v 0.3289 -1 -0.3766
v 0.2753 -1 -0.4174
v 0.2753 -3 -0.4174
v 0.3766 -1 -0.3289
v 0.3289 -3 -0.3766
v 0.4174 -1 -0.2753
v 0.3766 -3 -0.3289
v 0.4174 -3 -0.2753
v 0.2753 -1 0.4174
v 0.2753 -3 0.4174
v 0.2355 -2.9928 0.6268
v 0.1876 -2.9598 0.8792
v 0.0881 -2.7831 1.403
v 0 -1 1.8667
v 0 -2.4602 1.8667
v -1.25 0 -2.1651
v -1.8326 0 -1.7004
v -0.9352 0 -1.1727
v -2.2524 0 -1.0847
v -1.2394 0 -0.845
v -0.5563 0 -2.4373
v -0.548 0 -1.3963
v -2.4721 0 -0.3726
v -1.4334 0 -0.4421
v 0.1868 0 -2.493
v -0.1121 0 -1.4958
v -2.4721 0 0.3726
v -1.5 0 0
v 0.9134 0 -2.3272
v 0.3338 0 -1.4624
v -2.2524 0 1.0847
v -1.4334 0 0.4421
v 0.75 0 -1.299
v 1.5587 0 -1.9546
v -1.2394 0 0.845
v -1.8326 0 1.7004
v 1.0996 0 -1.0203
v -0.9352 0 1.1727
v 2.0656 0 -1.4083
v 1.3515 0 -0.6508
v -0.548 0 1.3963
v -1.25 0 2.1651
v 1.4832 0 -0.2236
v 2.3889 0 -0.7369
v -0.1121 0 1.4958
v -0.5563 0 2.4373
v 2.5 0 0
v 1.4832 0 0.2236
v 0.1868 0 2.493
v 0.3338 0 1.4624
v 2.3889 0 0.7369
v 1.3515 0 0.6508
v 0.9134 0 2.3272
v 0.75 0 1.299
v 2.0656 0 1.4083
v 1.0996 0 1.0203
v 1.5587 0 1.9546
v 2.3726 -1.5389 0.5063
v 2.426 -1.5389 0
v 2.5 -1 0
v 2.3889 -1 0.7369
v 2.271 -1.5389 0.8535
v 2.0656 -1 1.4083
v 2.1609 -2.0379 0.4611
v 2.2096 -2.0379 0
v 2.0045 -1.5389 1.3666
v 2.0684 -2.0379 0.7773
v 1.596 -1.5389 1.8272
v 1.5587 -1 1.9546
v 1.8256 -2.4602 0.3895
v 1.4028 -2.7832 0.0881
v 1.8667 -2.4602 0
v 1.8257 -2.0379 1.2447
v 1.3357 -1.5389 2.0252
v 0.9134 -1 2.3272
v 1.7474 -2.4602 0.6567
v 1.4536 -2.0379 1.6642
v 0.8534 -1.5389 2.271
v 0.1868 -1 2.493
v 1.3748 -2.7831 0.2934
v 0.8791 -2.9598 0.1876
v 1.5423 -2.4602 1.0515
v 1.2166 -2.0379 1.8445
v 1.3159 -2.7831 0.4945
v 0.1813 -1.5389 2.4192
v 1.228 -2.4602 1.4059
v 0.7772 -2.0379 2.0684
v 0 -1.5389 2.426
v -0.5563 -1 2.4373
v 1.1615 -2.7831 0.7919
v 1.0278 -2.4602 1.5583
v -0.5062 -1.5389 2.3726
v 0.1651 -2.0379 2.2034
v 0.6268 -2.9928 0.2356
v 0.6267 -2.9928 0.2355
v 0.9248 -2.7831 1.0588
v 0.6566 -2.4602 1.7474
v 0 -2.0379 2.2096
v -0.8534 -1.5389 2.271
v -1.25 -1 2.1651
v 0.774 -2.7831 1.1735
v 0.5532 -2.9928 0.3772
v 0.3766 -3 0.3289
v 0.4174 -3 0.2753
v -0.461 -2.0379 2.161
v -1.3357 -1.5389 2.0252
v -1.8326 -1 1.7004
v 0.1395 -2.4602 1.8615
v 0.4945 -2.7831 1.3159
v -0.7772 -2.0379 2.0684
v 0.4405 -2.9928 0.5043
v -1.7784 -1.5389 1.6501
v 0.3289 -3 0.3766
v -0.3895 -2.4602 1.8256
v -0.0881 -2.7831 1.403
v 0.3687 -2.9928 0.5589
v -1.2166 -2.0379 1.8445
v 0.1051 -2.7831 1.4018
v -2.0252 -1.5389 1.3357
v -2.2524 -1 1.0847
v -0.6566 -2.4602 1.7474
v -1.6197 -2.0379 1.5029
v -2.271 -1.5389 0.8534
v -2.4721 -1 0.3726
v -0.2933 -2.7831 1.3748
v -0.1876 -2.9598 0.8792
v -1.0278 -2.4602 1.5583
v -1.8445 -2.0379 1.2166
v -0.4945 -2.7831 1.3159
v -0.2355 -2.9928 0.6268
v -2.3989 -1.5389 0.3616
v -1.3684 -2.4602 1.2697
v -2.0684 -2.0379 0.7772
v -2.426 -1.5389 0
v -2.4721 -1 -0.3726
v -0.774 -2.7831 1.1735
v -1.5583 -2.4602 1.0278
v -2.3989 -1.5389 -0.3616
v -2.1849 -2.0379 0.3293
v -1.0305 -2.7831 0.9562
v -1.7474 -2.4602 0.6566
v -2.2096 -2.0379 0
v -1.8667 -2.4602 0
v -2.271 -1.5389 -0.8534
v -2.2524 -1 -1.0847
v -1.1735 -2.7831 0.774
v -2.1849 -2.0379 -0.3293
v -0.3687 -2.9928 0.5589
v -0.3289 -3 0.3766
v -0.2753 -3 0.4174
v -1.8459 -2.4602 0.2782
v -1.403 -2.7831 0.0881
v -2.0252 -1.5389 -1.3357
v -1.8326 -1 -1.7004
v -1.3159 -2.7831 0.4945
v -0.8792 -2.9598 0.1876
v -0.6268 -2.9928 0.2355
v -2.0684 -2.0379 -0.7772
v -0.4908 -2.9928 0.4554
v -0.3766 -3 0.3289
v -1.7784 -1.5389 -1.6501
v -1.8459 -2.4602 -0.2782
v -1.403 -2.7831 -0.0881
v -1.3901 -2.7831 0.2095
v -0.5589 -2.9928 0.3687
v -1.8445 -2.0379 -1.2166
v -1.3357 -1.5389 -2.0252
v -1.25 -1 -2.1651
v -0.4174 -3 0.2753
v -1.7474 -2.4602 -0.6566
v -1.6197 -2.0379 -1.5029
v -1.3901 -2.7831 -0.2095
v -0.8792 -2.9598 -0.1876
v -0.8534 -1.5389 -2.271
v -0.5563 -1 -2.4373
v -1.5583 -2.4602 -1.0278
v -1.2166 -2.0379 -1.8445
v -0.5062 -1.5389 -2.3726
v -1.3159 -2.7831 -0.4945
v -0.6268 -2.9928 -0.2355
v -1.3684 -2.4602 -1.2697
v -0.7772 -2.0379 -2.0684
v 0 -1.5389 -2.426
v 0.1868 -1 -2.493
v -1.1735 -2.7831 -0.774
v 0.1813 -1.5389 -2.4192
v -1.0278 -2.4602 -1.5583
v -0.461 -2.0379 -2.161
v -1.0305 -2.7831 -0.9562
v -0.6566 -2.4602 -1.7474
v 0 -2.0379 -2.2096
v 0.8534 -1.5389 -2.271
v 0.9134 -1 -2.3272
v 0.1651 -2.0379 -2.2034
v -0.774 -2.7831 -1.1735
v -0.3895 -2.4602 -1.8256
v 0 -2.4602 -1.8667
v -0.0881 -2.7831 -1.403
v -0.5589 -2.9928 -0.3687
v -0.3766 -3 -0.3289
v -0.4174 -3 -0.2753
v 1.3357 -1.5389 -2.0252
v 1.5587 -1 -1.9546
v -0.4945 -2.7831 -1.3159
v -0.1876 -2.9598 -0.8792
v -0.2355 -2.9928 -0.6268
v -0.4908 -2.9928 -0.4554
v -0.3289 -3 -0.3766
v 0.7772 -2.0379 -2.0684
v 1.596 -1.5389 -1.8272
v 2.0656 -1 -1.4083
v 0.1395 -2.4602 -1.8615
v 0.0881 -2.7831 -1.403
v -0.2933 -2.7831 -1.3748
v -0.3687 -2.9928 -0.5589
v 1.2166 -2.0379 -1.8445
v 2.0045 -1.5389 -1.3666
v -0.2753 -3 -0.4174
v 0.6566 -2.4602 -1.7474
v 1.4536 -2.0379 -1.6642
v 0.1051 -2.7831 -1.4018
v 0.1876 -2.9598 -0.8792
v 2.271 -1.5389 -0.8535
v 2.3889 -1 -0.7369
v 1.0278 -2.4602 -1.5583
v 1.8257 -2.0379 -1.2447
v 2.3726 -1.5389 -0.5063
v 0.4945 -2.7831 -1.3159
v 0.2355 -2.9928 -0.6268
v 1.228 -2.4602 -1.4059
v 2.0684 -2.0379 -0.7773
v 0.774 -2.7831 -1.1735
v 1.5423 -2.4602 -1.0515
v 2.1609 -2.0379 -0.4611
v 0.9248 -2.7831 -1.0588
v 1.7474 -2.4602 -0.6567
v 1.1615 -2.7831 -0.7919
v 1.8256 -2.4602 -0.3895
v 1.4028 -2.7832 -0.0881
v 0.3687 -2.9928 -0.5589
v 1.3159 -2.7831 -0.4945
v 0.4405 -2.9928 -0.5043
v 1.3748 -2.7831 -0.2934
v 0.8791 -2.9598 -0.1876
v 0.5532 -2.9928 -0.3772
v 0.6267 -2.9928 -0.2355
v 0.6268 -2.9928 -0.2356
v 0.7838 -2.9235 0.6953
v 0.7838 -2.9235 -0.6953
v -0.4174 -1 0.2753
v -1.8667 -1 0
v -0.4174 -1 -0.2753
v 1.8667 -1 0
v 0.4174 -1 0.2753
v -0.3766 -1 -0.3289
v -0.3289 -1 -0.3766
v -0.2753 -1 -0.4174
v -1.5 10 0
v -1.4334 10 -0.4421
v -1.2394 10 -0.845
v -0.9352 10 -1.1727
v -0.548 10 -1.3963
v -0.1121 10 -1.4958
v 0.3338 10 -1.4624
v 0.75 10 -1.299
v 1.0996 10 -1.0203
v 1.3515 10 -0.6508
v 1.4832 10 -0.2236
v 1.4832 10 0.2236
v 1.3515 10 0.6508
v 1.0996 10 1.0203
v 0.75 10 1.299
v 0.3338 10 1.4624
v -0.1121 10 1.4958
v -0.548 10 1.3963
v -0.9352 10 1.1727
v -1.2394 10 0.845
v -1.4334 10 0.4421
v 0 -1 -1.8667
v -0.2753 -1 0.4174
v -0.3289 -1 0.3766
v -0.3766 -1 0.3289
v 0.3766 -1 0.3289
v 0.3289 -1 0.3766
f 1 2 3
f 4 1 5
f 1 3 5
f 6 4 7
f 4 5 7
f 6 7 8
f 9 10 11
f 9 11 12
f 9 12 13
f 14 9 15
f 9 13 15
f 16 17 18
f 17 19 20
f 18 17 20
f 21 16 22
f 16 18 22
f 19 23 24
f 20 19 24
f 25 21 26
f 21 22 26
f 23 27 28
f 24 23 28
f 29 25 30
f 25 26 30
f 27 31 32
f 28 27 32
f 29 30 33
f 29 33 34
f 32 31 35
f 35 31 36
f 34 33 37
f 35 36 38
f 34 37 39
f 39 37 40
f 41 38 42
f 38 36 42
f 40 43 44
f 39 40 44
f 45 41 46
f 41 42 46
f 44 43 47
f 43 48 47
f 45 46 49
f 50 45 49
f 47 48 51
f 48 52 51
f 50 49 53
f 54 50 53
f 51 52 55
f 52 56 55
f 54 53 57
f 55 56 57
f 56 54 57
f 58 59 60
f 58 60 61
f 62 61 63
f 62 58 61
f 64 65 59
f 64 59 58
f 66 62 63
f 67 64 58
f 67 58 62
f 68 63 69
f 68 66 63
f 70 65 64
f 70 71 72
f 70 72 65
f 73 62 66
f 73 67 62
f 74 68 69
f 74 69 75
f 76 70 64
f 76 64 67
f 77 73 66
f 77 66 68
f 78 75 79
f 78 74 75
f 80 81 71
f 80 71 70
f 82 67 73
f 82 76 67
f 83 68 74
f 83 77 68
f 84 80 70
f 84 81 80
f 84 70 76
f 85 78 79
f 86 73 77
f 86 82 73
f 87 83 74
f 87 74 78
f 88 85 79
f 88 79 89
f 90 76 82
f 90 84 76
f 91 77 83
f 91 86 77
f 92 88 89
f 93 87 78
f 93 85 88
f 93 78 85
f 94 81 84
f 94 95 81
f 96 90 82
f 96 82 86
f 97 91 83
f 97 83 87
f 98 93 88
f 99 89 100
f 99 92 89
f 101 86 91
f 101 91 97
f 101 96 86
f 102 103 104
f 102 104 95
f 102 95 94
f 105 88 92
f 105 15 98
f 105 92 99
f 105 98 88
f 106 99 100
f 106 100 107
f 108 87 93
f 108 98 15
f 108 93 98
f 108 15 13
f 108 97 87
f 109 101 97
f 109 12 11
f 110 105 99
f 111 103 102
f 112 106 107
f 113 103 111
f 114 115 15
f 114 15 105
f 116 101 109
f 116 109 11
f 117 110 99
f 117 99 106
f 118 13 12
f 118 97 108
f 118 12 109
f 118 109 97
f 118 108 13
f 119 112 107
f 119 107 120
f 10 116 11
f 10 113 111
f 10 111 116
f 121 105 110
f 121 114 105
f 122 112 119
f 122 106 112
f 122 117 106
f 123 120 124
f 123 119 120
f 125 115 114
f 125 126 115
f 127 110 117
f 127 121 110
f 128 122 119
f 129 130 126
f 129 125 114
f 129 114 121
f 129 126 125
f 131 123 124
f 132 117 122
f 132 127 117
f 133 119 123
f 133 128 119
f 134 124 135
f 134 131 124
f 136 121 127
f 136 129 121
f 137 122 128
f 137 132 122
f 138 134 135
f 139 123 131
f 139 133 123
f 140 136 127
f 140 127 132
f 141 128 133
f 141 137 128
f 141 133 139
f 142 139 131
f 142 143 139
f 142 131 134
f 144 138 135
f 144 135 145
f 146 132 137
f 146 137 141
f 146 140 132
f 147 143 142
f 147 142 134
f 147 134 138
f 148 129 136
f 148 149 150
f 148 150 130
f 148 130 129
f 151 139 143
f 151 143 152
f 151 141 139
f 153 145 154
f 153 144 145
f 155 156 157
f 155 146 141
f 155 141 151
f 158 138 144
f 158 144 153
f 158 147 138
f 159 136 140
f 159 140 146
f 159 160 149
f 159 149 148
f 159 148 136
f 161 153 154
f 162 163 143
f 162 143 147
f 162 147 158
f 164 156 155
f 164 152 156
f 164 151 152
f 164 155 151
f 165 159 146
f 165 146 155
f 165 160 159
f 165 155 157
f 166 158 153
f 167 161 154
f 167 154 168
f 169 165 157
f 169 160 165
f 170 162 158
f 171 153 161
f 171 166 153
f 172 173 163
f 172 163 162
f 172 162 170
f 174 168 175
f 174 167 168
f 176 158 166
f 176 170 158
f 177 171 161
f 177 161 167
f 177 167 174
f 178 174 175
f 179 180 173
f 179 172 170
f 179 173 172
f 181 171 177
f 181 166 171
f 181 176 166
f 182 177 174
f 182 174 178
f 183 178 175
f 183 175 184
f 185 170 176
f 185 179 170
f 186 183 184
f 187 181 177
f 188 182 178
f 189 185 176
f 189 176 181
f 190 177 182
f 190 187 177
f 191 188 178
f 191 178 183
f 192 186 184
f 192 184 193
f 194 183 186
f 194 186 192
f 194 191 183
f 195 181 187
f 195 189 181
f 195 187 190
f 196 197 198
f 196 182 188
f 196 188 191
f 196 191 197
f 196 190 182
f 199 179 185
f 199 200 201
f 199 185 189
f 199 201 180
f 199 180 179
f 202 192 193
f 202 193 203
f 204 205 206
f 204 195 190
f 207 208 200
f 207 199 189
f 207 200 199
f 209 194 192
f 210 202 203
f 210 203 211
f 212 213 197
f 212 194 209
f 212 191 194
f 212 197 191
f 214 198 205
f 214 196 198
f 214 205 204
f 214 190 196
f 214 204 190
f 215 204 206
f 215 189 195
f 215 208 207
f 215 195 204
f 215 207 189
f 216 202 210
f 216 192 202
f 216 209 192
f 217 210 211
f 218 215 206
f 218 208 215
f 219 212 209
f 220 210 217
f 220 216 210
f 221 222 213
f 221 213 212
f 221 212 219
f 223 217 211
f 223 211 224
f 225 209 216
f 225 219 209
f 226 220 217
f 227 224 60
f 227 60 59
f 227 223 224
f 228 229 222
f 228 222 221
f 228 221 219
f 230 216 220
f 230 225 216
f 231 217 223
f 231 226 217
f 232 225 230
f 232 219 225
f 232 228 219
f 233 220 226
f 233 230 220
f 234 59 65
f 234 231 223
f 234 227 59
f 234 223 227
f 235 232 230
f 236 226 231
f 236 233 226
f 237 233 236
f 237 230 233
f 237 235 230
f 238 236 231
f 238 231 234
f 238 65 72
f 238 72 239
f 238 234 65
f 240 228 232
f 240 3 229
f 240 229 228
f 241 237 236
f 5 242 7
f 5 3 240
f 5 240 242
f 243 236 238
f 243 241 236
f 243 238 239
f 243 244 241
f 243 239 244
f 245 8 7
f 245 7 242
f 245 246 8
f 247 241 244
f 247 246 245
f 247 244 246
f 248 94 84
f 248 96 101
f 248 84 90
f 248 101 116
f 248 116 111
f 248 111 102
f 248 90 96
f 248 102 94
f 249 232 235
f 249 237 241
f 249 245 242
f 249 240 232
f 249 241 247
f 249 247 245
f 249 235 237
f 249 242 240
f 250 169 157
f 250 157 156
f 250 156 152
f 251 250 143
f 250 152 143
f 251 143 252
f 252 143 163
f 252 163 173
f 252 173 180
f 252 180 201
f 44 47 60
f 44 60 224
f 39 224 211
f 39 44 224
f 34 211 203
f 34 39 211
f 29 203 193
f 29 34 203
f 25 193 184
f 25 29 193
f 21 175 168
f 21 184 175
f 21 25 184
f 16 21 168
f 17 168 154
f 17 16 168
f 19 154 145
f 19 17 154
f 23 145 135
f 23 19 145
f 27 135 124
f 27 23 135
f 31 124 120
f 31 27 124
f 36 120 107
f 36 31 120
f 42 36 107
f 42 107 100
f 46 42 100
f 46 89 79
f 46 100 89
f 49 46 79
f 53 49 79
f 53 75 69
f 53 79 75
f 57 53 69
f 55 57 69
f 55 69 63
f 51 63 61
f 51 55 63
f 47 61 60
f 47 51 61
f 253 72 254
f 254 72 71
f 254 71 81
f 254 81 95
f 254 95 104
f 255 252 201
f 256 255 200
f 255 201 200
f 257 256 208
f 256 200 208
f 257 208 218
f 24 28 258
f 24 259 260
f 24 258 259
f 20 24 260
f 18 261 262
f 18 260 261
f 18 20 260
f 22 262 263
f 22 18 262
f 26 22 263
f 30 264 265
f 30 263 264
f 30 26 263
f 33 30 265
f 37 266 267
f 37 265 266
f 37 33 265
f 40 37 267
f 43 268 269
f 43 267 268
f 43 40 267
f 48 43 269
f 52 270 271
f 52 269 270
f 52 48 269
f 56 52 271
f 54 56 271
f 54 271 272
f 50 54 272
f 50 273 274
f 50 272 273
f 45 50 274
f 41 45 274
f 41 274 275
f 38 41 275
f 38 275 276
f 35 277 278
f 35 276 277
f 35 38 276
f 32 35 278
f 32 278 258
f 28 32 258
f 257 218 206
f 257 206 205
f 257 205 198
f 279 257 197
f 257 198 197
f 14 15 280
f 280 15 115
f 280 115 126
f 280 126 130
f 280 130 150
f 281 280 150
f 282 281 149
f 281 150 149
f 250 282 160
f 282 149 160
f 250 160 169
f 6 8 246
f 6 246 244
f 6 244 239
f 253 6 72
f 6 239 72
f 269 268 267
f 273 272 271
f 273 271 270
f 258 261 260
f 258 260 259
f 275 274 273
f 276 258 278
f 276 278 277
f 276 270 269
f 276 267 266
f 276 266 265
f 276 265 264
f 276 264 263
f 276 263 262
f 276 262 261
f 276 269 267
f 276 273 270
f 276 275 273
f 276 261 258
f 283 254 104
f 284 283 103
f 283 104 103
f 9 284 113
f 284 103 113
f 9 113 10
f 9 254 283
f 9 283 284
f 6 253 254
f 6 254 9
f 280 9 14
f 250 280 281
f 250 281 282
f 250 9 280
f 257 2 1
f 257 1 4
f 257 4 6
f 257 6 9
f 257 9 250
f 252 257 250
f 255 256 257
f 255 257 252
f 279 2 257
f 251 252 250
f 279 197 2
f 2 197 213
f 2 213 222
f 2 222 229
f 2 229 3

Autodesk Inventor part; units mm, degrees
ref_plane "YZ Plane" through (0, 0, 0) normal (1, 0, 0) x (0, 1, 0)
ref_plane "XZ Plane" through (0, 0, 0) normal (0, 1, 0) x (-1, 0, 0)
ref_plane "XY Plane" through (0, 0, 0) normal (0, 0, 1) x (1, 0, 0)
sketch "Sketch1" plane through (0, 0, 0) normal (0, 1, 0) x (-1, 0, 0)
  circle A0 centre (0, 0) radius 1.5
  dimension "d0" = 3
extrude "Extrusion1" add sketch "Sketch1" along normal blind 10
sketch "Sketch2" plane through (0, 0, 0) normal (0, -1, 0) x (1, 0, 0)
  circle A0 centre (0, 0) radius 2.5
  dimension "d3" = 5
extrude "Extrusion2" add sketch "Sketch2" along normal blind 3
fillet "Fillet1" radius 2 1 edges at (-2.5, -3, 0)
sketch "Sketch3" plane through (0, -3, 0) normal (0, -1, 0) x (1, 0, 0)
  circle A0 centre (0, 0) radius 0.5 projected
  line L0 (-1.8667, 0) -> (-0.4174, -0.2753)
  circle A1 centre (0, 0) radius 0.5 projected
  line L1 (-1.8667, 0) -> (-0.5, 0)
  dimension "d9" = 0
extrude "Extrusion3" cut sketch "Sketch3" against normal blind 2 contours A0 L0 L1
mirror "Mirror1" about plane through (0, 0, 0) normal (0, 0, 1) of "Extrusion3"
pattern_circular "Circular Pattern1" count 4 over 360 about axis through (0, -1, 0) along (0, -1, 0) of "Extrusion3", "Mirror1"
sketch "Sketch4" plane through (0, -3, 0) normal (0, -1, 0) x (1, 0, 0)
  arc A0 (-0.4174, 0.2753) -> (-0.4174, -0.2753) centre (0, 0) ccw projected
  arc A1 (-0.4174, -0.2753) -> (-0.2753, -0.4174) centre (0, 0) ccw projected
  arc A2 (-0.2753, -0.4174) -> (0.2753, -0.4174) centre (0, 0) ccw projected
  arc A3 (0.2753, -0.4174) -> (0.4174, -0.2753) centre (0, 0) ccw projected
  arc A4 (0.4174, -0.2753) -> (0.4174, 0.2753) centre (0, 0) ccw projected
  arc A5 (0.4174, 0.2753) -> (0.2753, 0.4174) centre (0, 0) ccw projected
  arc A6 (0.2753, 0.4174) -> (-0.2753, 0.4174) centre (0, 0) ccw projected
  arc A7 (-0.2753, 0.4174) -> (-0.4174, 0.2753) centre (0, 0) ccw projected
extrude "Extrusion4" cut sketch "Sketch4" against normal up to surface (2 mm away)
